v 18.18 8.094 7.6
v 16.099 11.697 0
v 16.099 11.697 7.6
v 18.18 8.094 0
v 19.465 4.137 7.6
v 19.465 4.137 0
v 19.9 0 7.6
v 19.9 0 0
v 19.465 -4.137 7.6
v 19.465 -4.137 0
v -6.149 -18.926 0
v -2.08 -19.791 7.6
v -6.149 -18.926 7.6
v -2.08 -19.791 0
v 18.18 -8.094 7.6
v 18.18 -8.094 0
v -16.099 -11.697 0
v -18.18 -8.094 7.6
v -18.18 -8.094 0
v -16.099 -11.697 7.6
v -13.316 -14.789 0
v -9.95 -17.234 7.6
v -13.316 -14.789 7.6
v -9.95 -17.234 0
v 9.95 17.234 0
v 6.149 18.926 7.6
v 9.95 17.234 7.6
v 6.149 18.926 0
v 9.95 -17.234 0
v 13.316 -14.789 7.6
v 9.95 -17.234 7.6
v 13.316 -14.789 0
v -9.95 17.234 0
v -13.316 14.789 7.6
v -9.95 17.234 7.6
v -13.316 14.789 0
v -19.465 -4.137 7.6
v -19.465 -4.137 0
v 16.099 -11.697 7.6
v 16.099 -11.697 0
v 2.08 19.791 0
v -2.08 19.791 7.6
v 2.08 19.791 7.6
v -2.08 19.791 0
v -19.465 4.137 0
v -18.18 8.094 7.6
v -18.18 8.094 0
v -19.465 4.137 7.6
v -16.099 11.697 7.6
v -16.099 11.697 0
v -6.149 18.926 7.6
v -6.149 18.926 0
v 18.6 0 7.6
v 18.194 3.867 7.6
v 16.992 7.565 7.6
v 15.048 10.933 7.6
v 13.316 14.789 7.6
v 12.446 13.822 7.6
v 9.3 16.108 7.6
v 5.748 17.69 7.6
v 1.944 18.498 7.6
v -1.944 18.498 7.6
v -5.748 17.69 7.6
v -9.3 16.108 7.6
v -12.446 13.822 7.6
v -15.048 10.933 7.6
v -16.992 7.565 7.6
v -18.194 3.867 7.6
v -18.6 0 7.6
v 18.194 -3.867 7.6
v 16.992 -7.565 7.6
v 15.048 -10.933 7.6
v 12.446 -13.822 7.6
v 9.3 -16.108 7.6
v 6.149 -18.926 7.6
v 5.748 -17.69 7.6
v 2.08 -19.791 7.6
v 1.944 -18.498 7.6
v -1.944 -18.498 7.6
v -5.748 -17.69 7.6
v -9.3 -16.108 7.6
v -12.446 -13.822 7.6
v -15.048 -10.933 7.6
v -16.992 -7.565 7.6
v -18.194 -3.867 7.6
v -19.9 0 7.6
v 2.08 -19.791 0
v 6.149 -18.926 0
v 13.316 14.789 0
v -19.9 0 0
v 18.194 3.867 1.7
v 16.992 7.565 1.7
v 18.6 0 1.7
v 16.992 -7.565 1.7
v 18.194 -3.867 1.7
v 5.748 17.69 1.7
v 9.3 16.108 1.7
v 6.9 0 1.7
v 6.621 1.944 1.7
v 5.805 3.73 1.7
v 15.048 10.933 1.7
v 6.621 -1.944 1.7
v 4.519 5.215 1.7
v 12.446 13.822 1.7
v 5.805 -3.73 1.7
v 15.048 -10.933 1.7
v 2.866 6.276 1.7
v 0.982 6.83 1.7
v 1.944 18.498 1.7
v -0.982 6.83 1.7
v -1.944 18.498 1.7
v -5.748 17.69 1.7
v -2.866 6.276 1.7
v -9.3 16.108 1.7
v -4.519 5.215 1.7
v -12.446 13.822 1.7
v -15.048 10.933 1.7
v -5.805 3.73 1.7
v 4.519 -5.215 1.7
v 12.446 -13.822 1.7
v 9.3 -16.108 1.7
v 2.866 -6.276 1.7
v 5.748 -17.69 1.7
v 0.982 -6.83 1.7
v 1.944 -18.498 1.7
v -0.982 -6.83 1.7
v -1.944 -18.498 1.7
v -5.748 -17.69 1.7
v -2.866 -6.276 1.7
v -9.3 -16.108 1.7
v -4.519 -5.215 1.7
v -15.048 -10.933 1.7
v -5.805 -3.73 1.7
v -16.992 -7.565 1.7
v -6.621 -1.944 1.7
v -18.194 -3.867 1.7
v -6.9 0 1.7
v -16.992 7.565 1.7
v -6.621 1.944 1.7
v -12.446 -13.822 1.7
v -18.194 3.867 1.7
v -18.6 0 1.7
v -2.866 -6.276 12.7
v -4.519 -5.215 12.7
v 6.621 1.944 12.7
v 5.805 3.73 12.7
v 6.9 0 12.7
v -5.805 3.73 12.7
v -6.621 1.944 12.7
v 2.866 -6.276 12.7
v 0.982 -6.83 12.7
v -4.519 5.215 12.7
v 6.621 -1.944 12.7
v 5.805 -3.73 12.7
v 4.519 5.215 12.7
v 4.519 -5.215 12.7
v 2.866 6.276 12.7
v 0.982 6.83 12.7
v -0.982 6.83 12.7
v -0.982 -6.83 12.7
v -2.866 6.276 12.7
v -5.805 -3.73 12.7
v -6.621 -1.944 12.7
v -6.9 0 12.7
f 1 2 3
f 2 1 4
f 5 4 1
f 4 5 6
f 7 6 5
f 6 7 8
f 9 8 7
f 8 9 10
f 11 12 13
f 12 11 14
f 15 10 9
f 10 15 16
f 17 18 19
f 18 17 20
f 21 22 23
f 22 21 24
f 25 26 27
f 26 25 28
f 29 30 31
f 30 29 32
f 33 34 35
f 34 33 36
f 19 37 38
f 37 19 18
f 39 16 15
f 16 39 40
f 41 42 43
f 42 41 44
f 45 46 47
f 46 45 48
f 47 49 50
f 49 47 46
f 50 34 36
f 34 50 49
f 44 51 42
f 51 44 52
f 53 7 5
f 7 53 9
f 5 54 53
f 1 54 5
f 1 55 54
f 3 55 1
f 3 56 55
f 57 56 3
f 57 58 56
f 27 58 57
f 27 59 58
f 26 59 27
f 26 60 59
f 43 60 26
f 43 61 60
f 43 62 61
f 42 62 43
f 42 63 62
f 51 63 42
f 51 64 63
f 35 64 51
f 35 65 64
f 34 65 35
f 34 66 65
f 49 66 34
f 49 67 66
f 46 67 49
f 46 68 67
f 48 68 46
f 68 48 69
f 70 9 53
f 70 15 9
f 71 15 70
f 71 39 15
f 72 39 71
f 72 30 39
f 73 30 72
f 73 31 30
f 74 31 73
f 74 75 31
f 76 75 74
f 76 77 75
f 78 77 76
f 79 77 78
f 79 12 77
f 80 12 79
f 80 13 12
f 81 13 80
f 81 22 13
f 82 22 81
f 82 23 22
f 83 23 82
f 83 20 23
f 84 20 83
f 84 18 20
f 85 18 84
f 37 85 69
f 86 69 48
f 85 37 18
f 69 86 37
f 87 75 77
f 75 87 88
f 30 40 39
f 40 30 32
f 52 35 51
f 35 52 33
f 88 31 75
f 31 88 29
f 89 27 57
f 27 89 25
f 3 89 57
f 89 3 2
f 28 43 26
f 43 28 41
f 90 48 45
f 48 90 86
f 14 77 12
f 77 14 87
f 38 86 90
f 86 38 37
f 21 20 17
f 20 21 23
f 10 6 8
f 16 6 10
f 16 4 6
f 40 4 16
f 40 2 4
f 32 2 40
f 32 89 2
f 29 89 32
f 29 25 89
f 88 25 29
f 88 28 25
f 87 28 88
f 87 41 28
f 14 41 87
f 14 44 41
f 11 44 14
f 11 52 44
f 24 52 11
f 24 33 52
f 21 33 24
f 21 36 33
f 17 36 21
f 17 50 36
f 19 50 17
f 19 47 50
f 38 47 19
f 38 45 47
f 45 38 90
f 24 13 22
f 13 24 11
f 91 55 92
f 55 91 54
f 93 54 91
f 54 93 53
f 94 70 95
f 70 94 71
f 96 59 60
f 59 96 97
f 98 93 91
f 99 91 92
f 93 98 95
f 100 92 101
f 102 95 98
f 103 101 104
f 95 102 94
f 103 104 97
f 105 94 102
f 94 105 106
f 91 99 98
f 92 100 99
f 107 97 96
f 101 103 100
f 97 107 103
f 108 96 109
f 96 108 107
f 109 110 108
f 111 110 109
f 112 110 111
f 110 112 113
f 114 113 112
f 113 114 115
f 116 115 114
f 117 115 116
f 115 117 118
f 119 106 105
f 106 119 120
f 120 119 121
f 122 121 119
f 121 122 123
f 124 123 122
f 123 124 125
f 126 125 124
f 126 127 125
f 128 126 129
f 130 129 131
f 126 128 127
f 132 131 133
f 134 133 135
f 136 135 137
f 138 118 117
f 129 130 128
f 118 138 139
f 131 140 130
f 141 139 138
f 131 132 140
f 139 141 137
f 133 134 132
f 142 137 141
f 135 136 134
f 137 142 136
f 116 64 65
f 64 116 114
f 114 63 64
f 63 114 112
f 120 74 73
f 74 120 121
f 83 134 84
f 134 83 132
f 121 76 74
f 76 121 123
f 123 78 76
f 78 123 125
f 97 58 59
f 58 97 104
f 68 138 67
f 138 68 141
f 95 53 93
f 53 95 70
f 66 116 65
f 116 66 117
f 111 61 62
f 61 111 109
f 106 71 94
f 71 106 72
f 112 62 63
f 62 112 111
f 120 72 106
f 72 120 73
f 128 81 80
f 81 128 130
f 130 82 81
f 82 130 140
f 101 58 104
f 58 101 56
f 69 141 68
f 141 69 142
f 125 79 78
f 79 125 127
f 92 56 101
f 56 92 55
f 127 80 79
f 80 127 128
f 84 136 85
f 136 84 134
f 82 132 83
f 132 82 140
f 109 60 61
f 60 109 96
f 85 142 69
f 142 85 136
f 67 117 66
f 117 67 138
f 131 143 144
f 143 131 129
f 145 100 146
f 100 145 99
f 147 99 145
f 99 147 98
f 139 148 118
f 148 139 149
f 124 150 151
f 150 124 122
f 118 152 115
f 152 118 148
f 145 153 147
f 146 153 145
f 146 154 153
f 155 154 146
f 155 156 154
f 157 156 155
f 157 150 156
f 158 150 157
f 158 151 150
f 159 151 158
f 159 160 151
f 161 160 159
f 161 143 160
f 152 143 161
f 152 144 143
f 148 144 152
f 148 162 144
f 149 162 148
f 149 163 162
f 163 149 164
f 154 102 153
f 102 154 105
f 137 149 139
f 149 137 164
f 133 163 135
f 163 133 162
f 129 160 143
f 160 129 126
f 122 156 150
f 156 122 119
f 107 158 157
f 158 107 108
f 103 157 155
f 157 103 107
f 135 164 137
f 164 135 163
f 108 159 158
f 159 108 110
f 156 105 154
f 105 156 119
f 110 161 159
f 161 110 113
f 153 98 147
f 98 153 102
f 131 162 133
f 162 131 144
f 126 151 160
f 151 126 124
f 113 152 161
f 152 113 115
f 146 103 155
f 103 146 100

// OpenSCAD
nekonecno = 100;

vyska_okraje = 7.6;
hloubka_kolecka = 5.9;
vyska_zakladny = vyska_okraje - hloubka_kolecka;

sirka_kolecka_s_okrajem = 39.8;
tloustka_kolecka = 2.6;
sirka_kolekca_bez_okraje = sirka_kolecka_s_okrajem - tloustka_kolecka;

vyska_stopky=12.7;
sirka_stopky_s_okrajem = 13.8;
difference() {
    cylinder(vyska_okraje, d=sirka_kolecka_s_okrajem);
    translate([0, 0, vyska_zakladny]) {
        cylinder(nekonecno, d=sirka_kolekca_bez_okraje);
    }
}
cylinder(vyska_stopky, d=sirka_stopky_s_okrajem);
